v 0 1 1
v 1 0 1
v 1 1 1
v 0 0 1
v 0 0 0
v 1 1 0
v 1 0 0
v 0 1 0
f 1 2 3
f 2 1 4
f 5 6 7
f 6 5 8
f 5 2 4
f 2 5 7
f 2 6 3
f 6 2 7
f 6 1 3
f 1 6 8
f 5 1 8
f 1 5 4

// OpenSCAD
module transform(x, y, z, scale) {
  translate([x, y, z * scale]) {
    cube([1, 1, 1]);
  }
}

// Example usage:
transform(0, 0, 0, 0.5);
